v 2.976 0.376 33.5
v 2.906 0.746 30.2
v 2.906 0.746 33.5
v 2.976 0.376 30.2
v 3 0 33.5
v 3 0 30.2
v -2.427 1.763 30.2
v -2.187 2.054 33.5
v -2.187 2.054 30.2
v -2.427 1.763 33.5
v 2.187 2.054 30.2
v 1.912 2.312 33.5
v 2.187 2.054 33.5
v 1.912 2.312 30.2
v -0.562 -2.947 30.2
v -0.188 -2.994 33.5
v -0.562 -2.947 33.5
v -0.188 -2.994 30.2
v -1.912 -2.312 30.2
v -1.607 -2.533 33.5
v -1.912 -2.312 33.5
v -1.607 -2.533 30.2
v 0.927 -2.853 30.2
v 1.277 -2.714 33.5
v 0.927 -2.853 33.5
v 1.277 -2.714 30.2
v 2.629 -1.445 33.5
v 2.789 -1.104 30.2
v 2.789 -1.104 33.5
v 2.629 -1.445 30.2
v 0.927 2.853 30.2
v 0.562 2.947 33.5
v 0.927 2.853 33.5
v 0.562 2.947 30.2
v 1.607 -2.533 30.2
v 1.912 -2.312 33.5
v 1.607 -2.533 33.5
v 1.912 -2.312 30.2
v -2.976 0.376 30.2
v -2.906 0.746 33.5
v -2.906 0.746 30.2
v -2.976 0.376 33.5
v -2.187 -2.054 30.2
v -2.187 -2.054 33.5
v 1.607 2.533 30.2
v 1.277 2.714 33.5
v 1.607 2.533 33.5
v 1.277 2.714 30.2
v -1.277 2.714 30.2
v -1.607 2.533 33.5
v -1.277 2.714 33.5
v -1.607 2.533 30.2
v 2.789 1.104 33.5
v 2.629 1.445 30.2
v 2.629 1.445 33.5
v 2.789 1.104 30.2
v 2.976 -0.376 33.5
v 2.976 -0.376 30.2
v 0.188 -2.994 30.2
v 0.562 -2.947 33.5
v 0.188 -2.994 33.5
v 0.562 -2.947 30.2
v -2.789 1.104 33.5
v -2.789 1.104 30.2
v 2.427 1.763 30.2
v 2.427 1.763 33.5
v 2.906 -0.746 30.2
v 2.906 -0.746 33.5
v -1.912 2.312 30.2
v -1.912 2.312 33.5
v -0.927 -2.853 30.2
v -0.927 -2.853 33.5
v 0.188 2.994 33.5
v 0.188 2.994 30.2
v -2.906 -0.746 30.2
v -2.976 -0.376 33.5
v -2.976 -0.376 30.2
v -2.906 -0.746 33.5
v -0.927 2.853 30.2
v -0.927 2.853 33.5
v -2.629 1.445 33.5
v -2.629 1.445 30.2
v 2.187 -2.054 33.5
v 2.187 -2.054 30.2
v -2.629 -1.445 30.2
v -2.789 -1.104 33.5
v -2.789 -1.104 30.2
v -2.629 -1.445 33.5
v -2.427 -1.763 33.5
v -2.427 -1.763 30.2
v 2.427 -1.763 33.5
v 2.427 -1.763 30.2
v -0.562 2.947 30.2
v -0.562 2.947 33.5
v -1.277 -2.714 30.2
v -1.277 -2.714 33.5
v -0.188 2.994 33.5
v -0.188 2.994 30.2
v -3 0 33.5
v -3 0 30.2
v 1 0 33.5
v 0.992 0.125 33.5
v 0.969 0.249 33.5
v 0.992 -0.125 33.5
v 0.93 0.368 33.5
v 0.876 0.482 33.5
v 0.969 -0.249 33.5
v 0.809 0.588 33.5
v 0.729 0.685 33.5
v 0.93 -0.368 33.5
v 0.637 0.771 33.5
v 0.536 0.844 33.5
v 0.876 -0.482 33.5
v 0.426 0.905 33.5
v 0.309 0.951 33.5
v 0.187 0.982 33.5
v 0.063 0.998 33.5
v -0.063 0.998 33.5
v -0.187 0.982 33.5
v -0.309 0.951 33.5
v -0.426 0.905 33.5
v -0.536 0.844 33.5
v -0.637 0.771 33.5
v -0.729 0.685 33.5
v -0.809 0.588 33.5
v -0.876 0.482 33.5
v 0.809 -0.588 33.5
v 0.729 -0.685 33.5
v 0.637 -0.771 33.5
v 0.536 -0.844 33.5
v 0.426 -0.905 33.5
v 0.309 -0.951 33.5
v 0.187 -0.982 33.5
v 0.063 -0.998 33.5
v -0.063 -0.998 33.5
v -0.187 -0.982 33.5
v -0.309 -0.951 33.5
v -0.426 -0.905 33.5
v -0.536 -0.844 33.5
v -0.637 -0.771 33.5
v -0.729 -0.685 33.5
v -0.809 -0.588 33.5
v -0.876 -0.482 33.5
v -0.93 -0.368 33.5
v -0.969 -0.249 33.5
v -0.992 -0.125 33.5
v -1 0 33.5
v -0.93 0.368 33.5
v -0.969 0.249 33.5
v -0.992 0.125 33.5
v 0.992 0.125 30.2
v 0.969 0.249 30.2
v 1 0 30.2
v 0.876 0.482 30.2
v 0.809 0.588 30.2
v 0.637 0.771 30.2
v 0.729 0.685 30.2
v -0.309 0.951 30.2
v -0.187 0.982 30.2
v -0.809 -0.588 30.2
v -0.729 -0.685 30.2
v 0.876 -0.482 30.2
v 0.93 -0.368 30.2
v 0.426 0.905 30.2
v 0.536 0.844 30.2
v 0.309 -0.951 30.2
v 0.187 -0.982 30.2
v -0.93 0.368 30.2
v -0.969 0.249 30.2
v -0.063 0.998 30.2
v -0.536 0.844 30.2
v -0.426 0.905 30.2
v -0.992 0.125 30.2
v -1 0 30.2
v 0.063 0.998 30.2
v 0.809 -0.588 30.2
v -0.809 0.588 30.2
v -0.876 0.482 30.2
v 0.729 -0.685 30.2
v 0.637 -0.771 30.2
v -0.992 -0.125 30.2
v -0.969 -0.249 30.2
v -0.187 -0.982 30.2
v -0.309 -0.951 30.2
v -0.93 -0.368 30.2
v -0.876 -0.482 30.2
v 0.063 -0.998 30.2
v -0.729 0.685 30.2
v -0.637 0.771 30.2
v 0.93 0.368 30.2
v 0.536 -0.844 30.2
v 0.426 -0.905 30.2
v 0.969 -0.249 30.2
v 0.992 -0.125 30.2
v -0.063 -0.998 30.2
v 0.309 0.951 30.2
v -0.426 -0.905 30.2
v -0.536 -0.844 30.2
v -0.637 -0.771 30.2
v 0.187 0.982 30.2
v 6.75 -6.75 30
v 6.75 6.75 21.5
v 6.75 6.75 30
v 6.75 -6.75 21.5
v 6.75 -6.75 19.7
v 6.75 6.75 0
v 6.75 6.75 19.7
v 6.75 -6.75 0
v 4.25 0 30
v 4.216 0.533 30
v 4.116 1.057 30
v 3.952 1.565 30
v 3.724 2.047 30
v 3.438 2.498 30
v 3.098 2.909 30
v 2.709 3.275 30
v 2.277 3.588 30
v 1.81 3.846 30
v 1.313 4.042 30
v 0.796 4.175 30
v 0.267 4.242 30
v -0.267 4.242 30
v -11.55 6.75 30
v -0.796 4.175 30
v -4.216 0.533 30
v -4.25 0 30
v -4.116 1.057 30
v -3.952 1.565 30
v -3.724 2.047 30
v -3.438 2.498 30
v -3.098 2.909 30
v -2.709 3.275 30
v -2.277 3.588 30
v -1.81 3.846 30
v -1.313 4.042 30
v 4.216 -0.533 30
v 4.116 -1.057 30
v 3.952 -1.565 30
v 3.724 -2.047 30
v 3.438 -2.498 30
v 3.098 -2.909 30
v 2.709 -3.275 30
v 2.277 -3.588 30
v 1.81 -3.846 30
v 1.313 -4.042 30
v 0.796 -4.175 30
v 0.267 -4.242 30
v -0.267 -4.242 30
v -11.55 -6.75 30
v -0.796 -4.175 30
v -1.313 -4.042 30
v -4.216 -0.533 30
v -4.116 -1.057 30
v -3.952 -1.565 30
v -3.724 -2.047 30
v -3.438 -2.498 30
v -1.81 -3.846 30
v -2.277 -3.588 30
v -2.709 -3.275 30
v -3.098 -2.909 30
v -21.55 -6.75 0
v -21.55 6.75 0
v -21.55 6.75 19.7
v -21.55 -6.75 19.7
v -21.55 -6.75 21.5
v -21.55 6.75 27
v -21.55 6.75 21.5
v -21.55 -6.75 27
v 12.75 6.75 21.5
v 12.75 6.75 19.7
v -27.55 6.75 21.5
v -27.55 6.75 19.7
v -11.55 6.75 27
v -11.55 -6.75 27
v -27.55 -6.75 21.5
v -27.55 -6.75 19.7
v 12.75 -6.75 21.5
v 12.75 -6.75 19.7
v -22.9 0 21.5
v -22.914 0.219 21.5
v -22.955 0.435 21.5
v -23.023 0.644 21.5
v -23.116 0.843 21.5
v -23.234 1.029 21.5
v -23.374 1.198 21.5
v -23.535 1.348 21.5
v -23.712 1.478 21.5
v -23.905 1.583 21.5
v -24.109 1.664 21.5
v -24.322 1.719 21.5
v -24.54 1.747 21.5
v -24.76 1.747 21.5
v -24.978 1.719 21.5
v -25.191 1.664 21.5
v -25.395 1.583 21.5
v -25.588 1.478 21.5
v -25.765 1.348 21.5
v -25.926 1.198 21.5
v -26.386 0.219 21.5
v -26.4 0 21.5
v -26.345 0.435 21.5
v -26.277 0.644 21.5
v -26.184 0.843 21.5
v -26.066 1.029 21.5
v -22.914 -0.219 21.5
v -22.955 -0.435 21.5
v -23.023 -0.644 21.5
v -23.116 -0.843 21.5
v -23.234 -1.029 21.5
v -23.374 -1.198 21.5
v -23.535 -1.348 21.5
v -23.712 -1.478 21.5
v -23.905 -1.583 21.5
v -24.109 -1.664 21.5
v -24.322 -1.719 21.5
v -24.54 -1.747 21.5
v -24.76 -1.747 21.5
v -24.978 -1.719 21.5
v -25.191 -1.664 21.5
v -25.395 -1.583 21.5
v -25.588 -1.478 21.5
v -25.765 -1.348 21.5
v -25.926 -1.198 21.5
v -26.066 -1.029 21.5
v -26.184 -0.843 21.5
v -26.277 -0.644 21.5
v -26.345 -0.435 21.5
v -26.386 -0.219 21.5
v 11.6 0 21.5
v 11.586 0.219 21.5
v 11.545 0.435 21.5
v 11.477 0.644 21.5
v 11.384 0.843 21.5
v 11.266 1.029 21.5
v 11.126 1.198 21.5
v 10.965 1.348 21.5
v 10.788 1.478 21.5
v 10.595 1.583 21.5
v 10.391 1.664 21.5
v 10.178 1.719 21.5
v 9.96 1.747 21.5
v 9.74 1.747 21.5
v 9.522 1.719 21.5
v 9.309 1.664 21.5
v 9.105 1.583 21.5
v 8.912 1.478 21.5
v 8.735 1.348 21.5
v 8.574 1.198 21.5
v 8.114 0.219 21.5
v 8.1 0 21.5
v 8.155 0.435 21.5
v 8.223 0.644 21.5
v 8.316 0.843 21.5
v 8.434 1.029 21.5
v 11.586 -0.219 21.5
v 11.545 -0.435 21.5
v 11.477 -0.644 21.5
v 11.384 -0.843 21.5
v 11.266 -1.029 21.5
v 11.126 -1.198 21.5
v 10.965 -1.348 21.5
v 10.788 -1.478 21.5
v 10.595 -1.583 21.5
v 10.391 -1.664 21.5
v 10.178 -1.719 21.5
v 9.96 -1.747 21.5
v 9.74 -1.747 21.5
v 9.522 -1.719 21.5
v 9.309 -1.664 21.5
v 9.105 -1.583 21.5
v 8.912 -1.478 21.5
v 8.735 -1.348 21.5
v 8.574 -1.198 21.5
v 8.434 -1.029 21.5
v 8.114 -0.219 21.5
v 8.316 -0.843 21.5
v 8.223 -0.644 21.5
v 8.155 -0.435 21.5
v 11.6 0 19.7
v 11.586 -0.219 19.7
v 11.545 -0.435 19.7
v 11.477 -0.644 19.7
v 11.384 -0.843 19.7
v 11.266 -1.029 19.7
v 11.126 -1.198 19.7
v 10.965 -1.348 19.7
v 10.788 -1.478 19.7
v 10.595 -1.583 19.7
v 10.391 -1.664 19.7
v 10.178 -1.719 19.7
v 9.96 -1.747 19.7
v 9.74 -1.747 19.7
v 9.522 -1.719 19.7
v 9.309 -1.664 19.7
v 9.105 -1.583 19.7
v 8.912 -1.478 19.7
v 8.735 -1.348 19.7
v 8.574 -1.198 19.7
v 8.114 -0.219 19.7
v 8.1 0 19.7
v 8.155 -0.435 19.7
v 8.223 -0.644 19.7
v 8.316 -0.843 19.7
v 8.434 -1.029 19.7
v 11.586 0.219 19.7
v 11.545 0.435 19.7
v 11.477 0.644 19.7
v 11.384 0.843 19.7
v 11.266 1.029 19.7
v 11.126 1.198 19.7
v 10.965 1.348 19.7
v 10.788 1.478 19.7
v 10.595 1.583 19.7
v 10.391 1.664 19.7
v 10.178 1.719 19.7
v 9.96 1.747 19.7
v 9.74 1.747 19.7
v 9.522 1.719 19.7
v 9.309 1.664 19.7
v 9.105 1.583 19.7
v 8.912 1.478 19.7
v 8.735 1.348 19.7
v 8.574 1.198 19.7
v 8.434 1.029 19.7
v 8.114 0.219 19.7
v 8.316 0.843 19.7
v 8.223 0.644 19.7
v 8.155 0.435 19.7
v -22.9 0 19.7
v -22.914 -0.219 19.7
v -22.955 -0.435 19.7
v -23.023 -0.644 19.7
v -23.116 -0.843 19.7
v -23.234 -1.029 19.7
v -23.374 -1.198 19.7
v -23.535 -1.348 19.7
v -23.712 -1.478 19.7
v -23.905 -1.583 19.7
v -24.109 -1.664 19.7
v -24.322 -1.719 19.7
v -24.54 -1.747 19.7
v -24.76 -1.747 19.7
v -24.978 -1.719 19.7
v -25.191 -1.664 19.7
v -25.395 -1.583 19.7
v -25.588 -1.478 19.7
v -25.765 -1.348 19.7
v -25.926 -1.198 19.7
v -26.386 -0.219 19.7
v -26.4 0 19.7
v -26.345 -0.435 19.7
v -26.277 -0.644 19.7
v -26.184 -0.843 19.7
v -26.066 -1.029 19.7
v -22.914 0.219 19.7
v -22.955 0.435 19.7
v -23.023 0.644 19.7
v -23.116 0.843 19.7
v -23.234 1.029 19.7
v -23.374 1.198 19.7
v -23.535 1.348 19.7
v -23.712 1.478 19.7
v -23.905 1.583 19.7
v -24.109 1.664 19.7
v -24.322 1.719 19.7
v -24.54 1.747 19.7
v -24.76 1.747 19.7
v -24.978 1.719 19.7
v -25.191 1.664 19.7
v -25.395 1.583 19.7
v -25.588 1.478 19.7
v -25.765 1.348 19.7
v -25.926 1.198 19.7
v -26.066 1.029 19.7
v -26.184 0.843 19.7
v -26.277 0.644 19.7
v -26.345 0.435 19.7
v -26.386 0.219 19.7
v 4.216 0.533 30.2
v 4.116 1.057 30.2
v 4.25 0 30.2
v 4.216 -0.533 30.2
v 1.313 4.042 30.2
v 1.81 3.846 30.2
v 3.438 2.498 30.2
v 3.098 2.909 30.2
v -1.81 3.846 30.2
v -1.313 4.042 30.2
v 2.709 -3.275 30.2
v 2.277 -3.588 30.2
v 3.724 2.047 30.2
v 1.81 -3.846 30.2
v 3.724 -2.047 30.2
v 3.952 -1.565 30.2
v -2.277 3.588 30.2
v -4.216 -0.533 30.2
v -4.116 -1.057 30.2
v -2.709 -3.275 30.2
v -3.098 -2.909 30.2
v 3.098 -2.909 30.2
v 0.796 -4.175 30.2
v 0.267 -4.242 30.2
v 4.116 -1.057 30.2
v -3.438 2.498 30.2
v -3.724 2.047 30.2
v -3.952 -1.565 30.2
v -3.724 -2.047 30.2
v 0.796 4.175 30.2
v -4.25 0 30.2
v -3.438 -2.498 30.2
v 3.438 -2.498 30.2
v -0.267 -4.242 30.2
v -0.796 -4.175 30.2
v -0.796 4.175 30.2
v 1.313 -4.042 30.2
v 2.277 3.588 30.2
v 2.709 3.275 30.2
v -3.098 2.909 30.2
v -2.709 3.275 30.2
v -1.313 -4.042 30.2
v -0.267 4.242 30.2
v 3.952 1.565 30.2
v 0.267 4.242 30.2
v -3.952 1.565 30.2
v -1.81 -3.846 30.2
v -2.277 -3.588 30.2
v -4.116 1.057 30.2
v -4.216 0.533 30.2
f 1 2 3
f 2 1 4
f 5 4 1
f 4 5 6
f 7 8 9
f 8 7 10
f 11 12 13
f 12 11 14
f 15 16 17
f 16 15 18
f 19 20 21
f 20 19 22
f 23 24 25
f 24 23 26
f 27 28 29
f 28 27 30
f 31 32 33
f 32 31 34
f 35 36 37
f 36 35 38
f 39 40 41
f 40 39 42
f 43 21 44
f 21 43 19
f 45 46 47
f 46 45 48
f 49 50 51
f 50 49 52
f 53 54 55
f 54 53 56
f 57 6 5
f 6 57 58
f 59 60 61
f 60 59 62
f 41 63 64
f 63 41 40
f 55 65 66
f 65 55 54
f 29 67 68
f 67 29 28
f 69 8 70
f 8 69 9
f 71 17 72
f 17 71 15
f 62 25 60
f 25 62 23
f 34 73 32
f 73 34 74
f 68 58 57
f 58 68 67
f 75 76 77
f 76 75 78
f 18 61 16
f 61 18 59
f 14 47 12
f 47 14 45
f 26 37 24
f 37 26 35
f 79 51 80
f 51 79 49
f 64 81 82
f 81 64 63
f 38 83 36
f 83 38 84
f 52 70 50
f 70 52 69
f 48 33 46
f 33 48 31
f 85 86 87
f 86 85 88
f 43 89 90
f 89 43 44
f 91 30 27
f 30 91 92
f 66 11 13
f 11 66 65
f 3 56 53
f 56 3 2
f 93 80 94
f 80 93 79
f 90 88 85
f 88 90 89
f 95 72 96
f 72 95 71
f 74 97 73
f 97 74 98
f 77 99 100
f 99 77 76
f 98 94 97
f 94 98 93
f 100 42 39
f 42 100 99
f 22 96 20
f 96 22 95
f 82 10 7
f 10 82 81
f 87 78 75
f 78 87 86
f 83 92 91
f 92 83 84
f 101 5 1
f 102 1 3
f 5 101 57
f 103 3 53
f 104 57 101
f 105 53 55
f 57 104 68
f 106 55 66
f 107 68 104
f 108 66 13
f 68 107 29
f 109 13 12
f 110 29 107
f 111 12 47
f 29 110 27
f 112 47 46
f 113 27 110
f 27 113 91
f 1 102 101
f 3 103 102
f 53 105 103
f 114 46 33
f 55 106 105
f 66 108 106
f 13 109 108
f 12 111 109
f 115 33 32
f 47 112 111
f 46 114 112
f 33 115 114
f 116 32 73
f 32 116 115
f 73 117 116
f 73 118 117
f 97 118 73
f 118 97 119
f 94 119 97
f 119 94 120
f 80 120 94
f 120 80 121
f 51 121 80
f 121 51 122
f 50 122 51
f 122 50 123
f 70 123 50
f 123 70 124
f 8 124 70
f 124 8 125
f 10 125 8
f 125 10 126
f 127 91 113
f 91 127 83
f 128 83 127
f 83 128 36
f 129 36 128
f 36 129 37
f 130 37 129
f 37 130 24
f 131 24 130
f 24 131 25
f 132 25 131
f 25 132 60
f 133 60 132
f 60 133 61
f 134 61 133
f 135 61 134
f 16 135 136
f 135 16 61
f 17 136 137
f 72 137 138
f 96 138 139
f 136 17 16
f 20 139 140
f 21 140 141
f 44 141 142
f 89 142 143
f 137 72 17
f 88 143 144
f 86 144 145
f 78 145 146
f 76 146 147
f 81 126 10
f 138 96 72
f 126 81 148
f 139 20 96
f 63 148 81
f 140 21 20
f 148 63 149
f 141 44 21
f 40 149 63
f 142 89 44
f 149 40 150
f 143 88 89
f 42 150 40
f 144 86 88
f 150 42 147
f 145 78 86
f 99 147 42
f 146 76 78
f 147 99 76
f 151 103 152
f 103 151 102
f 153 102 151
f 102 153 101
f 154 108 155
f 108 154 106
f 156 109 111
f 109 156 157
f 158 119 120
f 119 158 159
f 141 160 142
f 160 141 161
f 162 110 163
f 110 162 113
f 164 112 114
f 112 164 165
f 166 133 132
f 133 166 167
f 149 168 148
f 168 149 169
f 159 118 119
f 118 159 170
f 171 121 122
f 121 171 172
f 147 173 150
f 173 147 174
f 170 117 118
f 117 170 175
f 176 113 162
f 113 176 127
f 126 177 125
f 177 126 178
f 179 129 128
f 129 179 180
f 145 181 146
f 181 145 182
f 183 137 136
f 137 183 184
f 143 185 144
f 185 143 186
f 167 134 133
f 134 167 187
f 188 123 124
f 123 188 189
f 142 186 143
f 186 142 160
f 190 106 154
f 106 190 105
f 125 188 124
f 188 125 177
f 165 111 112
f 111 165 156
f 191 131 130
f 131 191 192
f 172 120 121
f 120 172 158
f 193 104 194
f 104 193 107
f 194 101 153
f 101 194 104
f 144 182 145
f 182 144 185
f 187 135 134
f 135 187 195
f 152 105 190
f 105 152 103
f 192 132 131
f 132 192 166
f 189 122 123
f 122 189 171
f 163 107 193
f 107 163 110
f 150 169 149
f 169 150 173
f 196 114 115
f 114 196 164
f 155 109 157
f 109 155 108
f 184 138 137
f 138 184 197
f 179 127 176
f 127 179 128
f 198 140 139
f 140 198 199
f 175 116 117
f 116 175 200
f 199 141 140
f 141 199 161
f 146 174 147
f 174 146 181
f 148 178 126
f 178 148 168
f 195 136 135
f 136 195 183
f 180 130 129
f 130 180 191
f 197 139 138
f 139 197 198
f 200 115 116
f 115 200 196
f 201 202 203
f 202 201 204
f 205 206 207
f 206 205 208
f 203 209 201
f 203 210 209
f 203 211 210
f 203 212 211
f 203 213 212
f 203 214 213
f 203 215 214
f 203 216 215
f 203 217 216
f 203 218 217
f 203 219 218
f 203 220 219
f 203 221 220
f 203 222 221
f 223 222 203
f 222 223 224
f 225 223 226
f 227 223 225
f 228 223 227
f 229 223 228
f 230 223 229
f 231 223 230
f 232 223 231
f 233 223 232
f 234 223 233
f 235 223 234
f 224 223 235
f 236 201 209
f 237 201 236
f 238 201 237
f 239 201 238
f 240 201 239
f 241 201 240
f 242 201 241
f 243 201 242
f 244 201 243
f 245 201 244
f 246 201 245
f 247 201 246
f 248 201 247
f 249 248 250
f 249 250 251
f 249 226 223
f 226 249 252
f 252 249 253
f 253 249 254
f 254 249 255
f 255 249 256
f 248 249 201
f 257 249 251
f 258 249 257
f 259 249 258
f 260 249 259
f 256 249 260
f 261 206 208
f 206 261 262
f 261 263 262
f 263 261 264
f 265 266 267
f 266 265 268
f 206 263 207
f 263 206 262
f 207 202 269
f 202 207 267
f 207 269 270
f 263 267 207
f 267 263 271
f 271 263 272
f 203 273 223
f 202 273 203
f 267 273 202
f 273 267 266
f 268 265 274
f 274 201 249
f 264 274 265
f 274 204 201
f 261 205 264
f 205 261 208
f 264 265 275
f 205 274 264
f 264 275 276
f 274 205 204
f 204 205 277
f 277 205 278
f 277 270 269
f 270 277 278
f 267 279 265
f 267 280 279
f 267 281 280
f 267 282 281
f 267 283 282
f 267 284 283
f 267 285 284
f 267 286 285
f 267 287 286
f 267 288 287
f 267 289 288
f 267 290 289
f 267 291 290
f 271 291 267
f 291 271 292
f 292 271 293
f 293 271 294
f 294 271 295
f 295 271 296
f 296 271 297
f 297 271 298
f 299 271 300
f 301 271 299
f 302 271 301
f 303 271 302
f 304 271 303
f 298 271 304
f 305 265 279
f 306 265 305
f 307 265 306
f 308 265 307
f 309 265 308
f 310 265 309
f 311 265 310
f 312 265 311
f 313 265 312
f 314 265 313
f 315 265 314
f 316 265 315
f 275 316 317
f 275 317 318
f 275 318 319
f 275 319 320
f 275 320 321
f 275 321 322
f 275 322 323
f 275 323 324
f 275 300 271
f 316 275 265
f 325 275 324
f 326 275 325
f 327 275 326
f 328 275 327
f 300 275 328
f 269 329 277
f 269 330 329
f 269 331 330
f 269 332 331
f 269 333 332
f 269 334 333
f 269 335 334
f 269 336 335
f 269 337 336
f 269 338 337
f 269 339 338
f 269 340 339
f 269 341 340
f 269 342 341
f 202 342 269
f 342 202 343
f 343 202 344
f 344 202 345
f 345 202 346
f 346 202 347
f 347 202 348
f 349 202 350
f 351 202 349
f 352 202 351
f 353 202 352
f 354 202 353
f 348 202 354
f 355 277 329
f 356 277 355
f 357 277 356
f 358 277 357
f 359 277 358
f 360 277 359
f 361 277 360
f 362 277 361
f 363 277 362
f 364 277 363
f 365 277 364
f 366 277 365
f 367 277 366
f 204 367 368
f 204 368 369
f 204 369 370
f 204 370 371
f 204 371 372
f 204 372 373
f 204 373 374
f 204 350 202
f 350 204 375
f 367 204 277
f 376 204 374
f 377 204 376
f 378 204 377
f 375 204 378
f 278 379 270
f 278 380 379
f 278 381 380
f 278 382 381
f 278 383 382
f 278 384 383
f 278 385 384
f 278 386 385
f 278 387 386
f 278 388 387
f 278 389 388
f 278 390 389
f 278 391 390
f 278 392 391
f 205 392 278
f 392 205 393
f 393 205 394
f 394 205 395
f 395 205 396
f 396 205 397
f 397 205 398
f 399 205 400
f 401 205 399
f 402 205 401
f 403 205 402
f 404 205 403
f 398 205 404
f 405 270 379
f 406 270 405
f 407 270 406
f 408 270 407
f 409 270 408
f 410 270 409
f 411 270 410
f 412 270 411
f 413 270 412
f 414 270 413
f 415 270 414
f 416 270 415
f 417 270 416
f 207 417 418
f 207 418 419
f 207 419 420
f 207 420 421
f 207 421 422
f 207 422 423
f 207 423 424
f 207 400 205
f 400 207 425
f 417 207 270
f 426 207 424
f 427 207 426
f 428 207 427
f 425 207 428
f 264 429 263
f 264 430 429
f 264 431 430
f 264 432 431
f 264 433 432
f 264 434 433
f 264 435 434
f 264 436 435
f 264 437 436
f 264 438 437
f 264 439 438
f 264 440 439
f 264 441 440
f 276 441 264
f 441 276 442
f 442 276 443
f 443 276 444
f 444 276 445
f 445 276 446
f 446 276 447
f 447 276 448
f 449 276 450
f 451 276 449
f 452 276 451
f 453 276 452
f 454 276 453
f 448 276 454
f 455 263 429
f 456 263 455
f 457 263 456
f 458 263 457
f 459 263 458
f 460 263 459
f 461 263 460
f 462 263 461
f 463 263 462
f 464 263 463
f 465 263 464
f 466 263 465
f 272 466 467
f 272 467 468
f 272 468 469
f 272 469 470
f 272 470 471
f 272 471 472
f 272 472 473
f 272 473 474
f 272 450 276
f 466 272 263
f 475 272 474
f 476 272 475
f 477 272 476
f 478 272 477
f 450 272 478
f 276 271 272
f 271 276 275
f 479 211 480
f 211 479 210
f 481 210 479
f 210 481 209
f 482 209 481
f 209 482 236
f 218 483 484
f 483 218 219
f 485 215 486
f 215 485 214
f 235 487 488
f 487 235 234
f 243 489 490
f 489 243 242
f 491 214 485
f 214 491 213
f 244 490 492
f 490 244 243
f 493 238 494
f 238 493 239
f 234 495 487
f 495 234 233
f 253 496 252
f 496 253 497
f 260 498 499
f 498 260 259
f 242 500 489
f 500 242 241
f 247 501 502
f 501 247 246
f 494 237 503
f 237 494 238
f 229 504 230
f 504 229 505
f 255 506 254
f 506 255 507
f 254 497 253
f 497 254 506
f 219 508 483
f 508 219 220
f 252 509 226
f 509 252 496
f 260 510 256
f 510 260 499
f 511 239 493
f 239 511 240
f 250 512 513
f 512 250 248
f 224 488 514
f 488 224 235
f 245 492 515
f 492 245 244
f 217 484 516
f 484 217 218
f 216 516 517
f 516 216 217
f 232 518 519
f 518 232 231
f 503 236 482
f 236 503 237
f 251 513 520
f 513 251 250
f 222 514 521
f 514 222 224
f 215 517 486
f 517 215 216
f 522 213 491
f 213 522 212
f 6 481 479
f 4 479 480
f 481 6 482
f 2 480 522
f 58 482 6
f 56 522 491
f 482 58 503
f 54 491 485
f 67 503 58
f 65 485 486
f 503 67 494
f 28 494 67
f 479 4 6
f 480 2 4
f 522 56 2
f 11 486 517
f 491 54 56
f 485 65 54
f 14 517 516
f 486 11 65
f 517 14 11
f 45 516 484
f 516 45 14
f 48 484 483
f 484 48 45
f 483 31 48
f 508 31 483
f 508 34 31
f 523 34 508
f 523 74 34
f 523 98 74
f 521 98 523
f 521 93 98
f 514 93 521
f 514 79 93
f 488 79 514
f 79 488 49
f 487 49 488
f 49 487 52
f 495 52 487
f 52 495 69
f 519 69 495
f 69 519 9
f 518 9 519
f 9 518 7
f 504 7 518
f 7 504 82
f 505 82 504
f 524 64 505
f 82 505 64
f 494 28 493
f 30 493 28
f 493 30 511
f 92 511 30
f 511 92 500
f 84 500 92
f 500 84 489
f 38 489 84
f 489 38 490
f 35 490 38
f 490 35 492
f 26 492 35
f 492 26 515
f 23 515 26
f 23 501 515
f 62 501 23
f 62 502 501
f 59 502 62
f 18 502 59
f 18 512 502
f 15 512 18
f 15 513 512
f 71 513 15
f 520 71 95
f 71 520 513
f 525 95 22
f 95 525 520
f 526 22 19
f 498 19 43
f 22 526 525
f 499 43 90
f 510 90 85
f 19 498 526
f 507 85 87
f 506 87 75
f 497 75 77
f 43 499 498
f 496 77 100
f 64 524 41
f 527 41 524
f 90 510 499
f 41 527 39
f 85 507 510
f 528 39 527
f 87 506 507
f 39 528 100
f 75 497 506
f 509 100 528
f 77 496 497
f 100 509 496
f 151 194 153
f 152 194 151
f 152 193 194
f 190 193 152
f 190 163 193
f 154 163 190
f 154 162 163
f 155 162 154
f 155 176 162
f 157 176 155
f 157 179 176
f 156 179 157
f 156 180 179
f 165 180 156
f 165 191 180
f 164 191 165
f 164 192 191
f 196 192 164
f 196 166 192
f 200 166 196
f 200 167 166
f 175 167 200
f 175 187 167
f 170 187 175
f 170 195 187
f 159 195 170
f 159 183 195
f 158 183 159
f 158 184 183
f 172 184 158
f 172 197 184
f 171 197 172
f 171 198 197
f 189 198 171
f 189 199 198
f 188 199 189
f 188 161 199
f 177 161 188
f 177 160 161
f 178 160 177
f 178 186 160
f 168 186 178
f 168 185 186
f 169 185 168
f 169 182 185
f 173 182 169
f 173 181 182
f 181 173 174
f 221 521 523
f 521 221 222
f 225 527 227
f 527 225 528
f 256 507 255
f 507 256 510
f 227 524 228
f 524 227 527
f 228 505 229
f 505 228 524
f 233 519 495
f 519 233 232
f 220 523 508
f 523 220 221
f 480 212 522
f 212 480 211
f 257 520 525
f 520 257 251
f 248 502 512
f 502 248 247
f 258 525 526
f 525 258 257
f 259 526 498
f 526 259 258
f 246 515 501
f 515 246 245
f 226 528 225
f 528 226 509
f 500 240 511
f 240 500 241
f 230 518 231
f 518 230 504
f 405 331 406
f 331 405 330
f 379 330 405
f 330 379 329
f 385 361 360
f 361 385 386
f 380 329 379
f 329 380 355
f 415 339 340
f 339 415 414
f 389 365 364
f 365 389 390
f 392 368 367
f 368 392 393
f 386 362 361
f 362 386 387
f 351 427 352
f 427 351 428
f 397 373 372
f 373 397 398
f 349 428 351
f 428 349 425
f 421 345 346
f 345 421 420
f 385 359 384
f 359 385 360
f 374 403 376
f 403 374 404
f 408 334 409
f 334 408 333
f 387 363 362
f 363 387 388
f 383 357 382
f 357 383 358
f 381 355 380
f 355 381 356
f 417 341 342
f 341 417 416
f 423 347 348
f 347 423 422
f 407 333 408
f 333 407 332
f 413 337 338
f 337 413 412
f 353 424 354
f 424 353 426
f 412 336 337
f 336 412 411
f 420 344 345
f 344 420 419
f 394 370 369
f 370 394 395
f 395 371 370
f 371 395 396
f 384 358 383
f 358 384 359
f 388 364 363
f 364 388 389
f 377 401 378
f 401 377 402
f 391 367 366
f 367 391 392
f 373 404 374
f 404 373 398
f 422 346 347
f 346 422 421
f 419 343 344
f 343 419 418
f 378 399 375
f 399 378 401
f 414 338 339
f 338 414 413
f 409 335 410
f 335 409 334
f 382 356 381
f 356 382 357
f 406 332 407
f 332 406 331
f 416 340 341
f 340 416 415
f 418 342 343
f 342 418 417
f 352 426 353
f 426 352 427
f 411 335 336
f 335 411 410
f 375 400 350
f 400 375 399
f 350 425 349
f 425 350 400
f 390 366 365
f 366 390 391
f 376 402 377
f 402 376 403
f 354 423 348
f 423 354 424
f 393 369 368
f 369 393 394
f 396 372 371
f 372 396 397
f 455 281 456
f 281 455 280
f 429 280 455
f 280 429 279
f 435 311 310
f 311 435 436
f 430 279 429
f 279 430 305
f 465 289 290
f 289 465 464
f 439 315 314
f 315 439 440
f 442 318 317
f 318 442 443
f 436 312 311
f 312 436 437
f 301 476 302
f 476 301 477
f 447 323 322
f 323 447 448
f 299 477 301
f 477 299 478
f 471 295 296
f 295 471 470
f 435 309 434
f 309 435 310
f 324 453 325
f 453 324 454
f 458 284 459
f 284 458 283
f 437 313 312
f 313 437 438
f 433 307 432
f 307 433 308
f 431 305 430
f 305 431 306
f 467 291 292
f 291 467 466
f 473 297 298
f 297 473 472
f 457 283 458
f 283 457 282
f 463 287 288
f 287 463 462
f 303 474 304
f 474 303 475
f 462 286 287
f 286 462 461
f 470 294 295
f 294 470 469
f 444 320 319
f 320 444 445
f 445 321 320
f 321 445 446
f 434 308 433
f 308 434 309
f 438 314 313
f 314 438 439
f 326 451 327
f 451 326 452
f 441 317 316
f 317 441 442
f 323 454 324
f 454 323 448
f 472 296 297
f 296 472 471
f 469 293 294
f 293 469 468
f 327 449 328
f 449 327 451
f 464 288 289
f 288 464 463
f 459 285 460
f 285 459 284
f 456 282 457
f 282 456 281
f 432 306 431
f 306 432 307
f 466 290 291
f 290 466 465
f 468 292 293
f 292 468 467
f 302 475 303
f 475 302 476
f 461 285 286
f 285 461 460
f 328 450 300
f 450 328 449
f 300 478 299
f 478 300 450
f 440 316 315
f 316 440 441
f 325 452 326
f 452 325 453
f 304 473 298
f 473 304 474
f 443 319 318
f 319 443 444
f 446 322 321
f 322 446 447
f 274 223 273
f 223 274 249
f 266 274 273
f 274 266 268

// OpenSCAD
// file: servo.scad
infinity=1000;

module Servo(L=41, W=20.5, H=36, CutoutL=0, CutoutH=0, FlangeL=7.5, FlangeH=2.5, FlangeFromTop=7,
	HolesN=2, HoleD=4, HolesXDist=48.5, HolesYDist=10, AxisD=6, AxisH=5.5, AxisHoleD=2,
	AxisFlangeD1=14.5, AxisFlangeD2=11, AxisFlangeH=1.5)
{
	x0=L-W/2;
	difference()
	{
		union()
		{
			// body
			translate([-x0, -W/2, 0])
				cube([L,W,H]);
			// mounting flanges
			translate([-x0-FlangeL, -W/2, H-FlangeH-FlangeFromTop])
				cube([L+2*FlangeL, W, FlangeH]);
			// axis flange
			translate([0, 0, H])
				cylinder(r1=AxisFlangeD1/2, r2=AxisFlangeD2/2, h=AxisFlangeH);
			// axis
			translate([0, 0, H])
				difference()
				{
					cylinder(r=AxisD/2, h=AxisH);
					cylinder(r=AxisHoleD/2, h=infinity, center=true);
				}
		}
		// top cut-out 
		translate([-infinity+CutoutL-x0, -infinity/2, H-CutoutH])
			cube([infinity, infinity, infinity]);
		// flange holes
		for(x=[1,-1])
			for(y=[1:HolesN])
				translate([-x0+L/2+HolesXDist/2*x,(HolesN-1)*HolesYDist*(y-1.5),0])
					cylinder(r=HoleD/2, h=infinity);
	}
}

$fn=50;
Servo();
// main file
use <servo.scad>

module ServoHK15148()
{
Servo(L=28.3, W=13.5, H=30, CutoutL=10, CutoutH=3, FlangeL=6, FlangeH=1.8, FlangeFromTop=8.5,
	HolesN=1, HoleD=3.5, HolesXDist=34.5, AxisD=6, AxisH=3.5, AxisHoleD=2,
	AxisFlangeD1=8.5, AxisFlangeD2=8.5, AxisFlangeH=0.2);
}

$fn=50;
ServoHK15148();
